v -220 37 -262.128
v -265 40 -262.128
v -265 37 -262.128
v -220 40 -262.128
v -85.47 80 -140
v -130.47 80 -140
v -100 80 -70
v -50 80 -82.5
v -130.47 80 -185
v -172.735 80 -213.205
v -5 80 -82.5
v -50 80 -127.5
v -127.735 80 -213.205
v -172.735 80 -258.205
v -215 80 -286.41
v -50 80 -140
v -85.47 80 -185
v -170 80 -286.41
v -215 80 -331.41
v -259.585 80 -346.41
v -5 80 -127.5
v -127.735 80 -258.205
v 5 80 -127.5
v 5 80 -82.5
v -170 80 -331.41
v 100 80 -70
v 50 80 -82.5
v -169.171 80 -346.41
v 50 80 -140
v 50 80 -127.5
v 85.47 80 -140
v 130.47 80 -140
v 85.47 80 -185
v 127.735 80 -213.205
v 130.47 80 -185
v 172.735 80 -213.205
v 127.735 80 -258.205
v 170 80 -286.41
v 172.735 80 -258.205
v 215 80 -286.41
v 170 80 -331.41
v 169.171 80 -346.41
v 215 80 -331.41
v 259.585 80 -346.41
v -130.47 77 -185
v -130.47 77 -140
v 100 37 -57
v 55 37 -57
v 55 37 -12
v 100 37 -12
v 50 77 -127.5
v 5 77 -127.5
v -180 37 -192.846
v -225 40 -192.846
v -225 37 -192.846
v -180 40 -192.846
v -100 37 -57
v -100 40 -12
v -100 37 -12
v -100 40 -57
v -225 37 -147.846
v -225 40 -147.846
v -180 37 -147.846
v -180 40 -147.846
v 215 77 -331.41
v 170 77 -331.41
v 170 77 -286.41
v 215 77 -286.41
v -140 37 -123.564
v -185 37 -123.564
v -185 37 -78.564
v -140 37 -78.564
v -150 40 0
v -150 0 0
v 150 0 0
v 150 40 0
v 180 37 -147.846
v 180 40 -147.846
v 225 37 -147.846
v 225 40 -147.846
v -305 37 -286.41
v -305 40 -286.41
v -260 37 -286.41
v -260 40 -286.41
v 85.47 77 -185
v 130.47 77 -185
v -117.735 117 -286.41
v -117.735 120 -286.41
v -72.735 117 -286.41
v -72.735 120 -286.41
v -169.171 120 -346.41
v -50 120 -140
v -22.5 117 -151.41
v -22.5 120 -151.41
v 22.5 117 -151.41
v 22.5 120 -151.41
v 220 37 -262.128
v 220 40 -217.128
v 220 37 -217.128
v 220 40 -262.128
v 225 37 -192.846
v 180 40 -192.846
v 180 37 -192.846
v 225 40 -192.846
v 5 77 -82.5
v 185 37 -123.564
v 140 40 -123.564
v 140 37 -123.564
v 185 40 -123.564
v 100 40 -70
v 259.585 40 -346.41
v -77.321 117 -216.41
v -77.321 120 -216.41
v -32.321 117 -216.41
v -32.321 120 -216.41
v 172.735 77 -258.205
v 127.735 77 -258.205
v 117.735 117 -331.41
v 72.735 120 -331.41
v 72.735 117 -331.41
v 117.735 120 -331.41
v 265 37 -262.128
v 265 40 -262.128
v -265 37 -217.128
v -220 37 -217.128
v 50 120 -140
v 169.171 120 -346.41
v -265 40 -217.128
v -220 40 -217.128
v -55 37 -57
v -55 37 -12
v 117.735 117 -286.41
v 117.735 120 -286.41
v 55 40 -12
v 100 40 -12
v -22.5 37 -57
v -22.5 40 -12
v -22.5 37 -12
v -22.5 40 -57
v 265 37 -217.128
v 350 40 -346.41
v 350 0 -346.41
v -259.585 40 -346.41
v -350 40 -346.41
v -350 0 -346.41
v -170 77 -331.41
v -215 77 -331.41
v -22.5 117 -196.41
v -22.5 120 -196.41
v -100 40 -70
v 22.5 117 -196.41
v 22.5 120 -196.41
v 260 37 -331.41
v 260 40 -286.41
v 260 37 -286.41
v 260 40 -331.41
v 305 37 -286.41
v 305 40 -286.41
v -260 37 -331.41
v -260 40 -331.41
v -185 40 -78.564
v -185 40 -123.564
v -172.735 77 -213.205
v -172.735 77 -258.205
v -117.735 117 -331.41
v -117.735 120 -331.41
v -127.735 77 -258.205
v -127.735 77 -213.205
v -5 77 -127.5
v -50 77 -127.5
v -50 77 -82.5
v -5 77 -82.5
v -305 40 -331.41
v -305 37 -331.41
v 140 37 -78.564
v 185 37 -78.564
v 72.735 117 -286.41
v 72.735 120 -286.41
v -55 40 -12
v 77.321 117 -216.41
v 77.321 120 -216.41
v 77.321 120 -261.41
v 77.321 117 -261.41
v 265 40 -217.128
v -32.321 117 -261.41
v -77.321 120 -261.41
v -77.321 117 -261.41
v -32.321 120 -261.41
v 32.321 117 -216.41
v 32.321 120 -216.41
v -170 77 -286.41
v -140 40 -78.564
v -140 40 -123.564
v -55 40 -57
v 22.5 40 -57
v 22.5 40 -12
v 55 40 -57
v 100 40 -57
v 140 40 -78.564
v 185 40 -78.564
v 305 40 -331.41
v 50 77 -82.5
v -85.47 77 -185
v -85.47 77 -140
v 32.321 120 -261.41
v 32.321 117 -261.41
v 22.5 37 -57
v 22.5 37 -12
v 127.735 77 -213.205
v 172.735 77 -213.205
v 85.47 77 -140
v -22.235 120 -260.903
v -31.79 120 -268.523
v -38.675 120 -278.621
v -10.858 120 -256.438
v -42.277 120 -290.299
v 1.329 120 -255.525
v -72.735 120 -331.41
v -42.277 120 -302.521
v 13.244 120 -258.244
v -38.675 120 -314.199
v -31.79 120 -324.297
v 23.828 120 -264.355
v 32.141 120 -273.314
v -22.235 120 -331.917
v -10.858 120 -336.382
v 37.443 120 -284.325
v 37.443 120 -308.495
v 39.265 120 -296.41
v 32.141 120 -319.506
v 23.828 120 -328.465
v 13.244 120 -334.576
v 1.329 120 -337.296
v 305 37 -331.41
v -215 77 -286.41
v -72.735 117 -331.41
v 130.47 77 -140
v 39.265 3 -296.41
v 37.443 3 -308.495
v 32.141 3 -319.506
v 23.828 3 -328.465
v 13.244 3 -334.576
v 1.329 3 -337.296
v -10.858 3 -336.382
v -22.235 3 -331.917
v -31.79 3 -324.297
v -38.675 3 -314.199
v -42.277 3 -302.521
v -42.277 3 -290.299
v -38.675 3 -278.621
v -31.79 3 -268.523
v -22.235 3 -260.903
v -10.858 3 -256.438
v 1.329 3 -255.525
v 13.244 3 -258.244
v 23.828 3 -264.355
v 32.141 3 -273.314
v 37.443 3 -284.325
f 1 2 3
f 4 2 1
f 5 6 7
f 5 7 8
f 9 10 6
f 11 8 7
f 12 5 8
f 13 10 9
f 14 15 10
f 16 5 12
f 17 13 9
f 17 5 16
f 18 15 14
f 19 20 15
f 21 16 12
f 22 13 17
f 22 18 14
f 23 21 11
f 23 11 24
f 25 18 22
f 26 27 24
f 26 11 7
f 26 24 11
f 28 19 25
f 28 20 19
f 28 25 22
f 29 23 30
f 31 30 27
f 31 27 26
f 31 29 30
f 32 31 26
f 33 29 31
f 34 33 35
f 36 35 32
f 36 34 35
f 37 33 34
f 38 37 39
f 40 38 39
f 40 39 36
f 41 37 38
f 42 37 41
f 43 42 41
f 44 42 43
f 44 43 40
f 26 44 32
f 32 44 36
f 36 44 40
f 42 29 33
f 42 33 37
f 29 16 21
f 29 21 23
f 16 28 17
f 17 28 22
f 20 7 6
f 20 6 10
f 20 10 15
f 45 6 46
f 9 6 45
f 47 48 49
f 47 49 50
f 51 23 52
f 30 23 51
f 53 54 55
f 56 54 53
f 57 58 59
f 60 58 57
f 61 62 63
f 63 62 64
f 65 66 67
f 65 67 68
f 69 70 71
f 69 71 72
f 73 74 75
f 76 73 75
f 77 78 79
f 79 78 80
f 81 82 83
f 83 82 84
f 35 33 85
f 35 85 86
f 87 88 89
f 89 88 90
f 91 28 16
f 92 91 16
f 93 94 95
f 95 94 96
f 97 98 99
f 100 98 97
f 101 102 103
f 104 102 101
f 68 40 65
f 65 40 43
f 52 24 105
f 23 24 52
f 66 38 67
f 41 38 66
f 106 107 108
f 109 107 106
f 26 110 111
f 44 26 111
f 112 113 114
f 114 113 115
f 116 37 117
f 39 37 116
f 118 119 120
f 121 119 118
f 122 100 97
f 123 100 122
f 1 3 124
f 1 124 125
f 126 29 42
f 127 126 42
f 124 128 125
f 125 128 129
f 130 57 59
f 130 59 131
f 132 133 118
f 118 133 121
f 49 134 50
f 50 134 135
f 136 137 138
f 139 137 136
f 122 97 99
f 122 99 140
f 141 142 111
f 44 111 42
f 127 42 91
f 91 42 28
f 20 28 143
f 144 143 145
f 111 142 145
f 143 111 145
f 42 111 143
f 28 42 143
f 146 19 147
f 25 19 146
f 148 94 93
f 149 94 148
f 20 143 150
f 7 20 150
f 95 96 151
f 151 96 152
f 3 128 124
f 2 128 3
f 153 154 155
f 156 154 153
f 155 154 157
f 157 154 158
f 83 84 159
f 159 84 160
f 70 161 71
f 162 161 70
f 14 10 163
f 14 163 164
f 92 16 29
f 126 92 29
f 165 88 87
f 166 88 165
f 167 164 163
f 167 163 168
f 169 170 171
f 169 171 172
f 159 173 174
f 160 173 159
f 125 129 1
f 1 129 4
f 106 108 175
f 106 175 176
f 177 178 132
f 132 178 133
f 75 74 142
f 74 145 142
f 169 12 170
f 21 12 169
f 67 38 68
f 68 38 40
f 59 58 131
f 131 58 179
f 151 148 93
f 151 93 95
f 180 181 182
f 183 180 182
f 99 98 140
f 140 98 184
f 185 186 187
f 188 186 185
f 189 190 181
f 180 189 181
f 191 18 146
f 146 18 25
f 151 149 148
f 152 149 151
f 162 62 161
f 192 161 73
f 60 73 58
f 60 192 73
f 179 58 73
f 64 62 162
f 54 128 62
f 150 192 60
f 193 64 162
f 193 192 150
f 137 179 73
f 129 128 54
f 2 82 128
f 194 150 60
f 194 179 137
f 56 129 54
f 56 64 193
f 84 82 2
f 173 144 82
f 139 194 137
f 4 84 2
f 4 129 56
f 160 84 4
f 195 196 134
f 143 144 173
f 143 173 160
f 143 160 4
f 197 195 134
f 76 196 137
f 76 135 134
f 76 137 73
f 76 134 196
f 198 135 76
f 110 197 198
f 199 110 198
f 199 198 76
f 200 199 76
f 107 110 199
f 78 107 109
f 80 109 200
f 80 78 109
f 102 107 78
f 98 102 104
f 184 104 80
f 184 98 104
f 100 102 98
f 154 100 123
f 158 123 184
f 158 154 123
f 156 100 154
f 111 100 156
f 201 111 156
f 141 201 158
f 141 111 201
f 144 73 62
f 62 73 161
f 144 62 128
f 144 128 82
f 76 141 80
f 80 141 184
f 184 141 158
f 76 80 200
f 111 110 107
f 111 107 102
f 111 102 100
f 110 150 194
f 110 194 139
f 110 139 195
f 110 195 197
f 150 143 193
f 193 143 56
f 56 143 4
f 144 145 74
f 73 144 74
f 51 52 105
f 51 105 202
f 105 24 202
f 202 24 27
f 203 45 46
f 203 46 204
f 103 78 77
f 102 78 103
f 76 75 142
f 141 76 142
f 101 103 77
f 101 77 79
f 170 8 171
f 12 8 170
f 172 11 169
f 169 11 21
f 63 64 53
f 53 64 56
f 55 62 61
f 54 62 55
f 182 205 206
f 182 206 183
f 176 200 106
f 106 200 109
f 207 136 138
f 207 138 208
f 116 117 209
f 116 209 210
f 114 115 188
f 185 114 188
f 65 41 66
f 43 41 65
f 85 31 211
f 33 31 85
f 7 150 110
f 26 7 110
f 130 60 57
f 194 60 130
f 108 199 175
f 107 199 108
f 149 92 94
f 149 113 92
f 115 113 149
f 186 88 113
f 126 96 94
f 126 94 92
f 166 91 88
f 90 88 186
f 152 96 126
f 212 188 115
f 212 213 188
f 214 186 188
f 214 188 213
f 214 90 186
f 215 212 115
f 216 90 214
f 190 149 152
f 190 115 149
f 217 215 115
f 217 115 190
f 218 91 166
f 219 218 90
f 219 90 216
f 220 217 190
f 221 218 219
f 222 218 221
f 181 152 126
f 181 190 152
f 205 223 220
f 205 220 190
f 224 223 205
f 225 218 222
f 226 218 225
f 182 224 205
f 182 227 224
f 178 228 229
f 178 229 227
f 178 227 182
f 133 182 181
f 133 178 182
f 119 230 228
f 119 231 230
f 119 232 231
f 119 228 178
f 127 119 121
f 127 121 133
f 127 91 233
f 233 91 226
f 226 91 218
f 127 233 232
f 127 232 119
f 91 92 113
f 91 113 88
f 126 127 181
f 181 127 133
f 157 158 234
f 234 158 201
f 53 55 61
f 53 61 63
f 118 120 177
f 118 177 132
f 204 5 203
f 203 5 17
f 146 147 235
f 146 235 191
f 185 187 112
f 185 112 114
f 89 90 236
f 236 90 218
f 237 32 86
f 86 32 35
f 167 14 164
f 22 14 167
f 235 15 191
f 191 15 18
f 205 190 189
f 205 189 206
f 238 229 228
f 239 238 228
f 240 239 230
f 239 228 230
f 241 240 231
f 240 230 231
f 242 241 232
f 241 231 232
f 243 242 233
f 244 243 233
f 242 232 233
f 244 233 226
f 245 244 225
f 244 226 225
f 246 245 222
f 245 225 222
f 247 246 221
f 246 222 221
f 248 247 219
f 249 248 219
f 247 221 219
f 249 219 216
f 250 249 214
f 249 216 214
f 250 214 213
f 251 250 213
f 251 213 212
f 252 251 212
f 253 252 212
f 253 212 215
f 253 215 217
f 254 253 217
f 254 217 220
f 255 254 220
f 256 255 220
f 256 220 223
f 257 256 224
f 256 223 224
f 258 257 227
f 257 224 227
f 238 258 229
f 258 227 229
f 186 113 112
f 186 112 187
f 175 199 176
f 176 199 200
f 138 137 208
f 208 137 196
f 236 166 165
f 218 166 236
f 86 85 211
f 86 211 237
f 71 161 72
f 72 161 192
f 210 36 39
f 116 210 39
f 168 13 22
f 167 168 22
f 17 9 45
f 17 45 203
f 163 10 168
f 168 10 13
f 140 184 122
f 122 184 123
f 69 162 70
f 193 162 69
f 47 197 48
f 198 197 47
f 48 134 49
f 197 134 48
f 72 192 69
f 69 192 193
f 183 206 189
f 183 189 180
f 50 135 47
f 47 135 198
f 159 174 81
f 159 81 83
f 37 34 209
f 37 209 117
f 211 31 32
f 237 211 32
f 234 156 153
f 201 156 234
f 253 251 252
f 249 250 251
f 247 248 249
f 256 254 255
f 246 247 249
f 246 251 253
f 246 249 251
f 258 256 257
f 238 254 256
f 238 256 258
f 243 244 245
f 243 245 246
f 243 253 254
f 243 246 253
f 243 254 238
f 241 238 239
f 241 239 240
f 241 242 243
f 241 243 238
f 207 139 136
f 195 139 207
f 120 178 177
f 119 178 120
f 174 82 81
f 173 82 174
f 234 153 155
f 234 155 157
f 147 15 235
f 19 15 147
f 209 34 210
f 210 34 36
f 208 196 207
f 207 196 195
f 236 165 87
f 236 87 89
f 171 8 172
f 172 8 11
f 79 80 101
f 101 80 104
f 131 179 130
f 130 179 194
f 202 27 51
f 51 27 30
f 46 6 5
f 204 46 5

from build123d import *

# Parameters (mm, degrees)
BOSS_EXTRUDE1_DEPTH = 40
BOSS_EXTRUDE2_DEPTH = 40
BOSS_EXTRUDE3_DEPTH = 80
SKETCH7_W           = 45
SKETCH7_H           = 45
CUT_EXTRUDE2_DEPTH  = 3
SKETCH8_W           = 45
SKETCH8_H           = 45
CUT_EXTRUDE3_DEPTH  = 3
SKETCH9_W           = 45
SKETCH9_H           = 45
CUT_EXTRUDE4_DEPTH  = 3
SKETCH11_W          = 45
SKETCH11_H          = 45
CUT_EXTRUDE5_DEPTH  = 3
SKETCH13_R          = 41
CUT_EXTRUDE6_DEPTH  = 117


with BuildPart() as part:
    # Sketch1 → Boss-Extrude1 (new body)
    with BuildSketch(Plane(origin=(0, 0, 0), x_dir=(1, 0, 0), z_dir=(0, 1, 0))):
        Polygon((-150, 0), (150, 0), (350, 346.410161514), (-350, 346.410161514), align=None)
    extrude(amount=BOSS_EXTRUDE1_DEPTH)

    # Sketch3 → Boss-Extrude2 (add)
    with BuildSketch(Plane(origin=(0, 40, 0), x_dir=(1, 0, 0), z_dir=(0, 1, 0))):
        Polygon((-100, 70), (100, 70), (259.585481157, 346.410161514), (169.170962313, 346.410161514), (50, 140), (-50, 140), (-169.170962313, 346.410161514), (-259.585481157, 346.410161514), align=None)
    extrude(amount=BOSS_EXTRUDE2_DEPTH)

    # Sketch4 → Boss-Extrude3 (add)
    with BuildSketch(Plane(origin=(0, 40, 0), x_dir=(1, 0, 0), z_dir=(0, 1, 0))):
        Polygon((169.170962313, 346.410161514), (-169.170962313, 346.410161514), (-50, 140), (50, 140), align=None)
    extrude(amount=BOSS_EXTRUDE3_DEPTH)

    # Sketch7 → Cut-Extrude2 (cut)
    with BuildSketch(Plane(origin=(0, 40, 0), x_dir=(1, 0, 0), z_dir=(0, 1, 0))):
        with Locations((-282.5, 308.910161514)):
            Rectangle(SKETCH7_W, SKETCH7_H)
        with Locations((-77.5, 34.5)):
            Rectangle(SKETCH7_W, SKETCH7_H)
        with Locations((-242.5, 239.628129211)):
            Rectangle(SKETCH7_W, SKETCH7_H)
        with Locations((-202.5, 170.346096908)):
            Rectangle(SKETCH7_W, SKETCH7_H)
        with Locations((-162.5, 101.064064606)):
            Rectangle(SKETCH7_W, SKETCH7_H)
        with Locations((282.5, 308.910161514)):
            Rectangle(SKETCH7_W, SKETCH7_H)
        with Locations((162.5, 101.064064606)):
            Rectangle(SKETCH7_W, SKETCH7_H)
        with Locations((202.5, 170.346096908)):
            Rectangle(SKETCH7_W, SKETCH7_H)
        with Locations((242.5, 239.628129211)):
            Rectangle(SKETCH7_W, SKETCH7_H)
        with Locations((0, 34.5)):
            Rectangle(SKETCH7_W, SKETCH7_H)
        with Locations((77.5, 34.5)):
            Rectangle(SKETCH7_W, SKETCH7_H)
    extrude(amount=-CUT_EXTRUDE2_DEPTH, mode=Mode.SUBTRACT)

    # Sketch8 → Cut-Extrude3 (cut)
    with BuildSketch(Plane(origin=(0, 80, 0), x_dir=(1, 0, 0), z_dir=(0, 1, 0))):
        with Locations((-192.5, 308.910161514)):
            Rectangle(SKETCH8_W, SKETCH8_H)
        with Locations((-150.235026919, 235.705080757)):
            Rectangle(SKETCH8_W, SKETCH8_H)
        with Locations((-107.970053838, 162.5)):
            Rectangle(SKETCH8_W, SKETCH8_H)
        with Locations((192.5, 308.910161514)):
            Rectangle(SKETCH8_W, SKETCH8_H)
        with Locations((150.235026919, 235.705080757)):
            Rectangle(SKETCH8_W, SKETCH8_H)
        with Locations((107.970053838, 162.5)):
            Rectangle(SKETCH8_W, SKETCH8_H)
    extrude(amount=-CUT_EXTRUDE3_DEPTH, mode=Mode.SUBTRACT)

    # Sketch9 → Cut-Extrude4 (cut)
    with BuildSketch(Plane(origin=(0, 80, 0), x_dir=(1, 0, 0), z_dir=(0, 1, 0))):
        with Locations((-27.5, 105)):
            Rectangle(SKETCH9_W, SKETCH9_H)
        with Locations((27.5, 105)):
            Rectangle(SKETCH9_W, SKETCH9_H)
    extrude(amount=-CUT_EXTRUDE4_DEPTH, mode=Mode.SUBTRACT)

    # Sketch11 → Cut-Extrude5 (cut)
    with BuildSketch(Plane(origin=(0, 120, 0), x_dir=(1, 0, 0), z_dir=(0, 1, 0))):
        with Locations((-54.820508076, 238.910161514)):
            Rectangle(SKETCH11_W, SKETCH11_H)
        with Locations((-95.235026919, 308.910161514)):
            Rectangle(SKETCH11_W, SKETCH11_H)
        with Locations((54.820508076, 238.910161514)):
            Rectangle(SKETCH11_W, SKETCH11_H)
        with Locations((95.235026919, 308.910161514)):
            Rectangle(SKETCH11_W, SKETCH11_H)
        with Locations((0, 173.910161514)):
            Rectangle(SKETCH11_W, SKETCH11_H)
    extrude(amount=-CUT_EXTRUDE5_DEPTH, mode=Mode.SUBTRACT)

    # Sketch13 → Cut-Extrude6 (cut)
    with BuildSketch(Plane(origin=(0, 120, 0), x_dir=(1, 0, 0), z_dir=(0, 1, 0))):
        with Locations((-1.735026919, 296.410161514)):
            Circle(SKETCH13_R)
    extrude(amount=-CUT_EXTRUDE6_DEPTH, mode=Mode.SUBTRACT)


solid = part.part
